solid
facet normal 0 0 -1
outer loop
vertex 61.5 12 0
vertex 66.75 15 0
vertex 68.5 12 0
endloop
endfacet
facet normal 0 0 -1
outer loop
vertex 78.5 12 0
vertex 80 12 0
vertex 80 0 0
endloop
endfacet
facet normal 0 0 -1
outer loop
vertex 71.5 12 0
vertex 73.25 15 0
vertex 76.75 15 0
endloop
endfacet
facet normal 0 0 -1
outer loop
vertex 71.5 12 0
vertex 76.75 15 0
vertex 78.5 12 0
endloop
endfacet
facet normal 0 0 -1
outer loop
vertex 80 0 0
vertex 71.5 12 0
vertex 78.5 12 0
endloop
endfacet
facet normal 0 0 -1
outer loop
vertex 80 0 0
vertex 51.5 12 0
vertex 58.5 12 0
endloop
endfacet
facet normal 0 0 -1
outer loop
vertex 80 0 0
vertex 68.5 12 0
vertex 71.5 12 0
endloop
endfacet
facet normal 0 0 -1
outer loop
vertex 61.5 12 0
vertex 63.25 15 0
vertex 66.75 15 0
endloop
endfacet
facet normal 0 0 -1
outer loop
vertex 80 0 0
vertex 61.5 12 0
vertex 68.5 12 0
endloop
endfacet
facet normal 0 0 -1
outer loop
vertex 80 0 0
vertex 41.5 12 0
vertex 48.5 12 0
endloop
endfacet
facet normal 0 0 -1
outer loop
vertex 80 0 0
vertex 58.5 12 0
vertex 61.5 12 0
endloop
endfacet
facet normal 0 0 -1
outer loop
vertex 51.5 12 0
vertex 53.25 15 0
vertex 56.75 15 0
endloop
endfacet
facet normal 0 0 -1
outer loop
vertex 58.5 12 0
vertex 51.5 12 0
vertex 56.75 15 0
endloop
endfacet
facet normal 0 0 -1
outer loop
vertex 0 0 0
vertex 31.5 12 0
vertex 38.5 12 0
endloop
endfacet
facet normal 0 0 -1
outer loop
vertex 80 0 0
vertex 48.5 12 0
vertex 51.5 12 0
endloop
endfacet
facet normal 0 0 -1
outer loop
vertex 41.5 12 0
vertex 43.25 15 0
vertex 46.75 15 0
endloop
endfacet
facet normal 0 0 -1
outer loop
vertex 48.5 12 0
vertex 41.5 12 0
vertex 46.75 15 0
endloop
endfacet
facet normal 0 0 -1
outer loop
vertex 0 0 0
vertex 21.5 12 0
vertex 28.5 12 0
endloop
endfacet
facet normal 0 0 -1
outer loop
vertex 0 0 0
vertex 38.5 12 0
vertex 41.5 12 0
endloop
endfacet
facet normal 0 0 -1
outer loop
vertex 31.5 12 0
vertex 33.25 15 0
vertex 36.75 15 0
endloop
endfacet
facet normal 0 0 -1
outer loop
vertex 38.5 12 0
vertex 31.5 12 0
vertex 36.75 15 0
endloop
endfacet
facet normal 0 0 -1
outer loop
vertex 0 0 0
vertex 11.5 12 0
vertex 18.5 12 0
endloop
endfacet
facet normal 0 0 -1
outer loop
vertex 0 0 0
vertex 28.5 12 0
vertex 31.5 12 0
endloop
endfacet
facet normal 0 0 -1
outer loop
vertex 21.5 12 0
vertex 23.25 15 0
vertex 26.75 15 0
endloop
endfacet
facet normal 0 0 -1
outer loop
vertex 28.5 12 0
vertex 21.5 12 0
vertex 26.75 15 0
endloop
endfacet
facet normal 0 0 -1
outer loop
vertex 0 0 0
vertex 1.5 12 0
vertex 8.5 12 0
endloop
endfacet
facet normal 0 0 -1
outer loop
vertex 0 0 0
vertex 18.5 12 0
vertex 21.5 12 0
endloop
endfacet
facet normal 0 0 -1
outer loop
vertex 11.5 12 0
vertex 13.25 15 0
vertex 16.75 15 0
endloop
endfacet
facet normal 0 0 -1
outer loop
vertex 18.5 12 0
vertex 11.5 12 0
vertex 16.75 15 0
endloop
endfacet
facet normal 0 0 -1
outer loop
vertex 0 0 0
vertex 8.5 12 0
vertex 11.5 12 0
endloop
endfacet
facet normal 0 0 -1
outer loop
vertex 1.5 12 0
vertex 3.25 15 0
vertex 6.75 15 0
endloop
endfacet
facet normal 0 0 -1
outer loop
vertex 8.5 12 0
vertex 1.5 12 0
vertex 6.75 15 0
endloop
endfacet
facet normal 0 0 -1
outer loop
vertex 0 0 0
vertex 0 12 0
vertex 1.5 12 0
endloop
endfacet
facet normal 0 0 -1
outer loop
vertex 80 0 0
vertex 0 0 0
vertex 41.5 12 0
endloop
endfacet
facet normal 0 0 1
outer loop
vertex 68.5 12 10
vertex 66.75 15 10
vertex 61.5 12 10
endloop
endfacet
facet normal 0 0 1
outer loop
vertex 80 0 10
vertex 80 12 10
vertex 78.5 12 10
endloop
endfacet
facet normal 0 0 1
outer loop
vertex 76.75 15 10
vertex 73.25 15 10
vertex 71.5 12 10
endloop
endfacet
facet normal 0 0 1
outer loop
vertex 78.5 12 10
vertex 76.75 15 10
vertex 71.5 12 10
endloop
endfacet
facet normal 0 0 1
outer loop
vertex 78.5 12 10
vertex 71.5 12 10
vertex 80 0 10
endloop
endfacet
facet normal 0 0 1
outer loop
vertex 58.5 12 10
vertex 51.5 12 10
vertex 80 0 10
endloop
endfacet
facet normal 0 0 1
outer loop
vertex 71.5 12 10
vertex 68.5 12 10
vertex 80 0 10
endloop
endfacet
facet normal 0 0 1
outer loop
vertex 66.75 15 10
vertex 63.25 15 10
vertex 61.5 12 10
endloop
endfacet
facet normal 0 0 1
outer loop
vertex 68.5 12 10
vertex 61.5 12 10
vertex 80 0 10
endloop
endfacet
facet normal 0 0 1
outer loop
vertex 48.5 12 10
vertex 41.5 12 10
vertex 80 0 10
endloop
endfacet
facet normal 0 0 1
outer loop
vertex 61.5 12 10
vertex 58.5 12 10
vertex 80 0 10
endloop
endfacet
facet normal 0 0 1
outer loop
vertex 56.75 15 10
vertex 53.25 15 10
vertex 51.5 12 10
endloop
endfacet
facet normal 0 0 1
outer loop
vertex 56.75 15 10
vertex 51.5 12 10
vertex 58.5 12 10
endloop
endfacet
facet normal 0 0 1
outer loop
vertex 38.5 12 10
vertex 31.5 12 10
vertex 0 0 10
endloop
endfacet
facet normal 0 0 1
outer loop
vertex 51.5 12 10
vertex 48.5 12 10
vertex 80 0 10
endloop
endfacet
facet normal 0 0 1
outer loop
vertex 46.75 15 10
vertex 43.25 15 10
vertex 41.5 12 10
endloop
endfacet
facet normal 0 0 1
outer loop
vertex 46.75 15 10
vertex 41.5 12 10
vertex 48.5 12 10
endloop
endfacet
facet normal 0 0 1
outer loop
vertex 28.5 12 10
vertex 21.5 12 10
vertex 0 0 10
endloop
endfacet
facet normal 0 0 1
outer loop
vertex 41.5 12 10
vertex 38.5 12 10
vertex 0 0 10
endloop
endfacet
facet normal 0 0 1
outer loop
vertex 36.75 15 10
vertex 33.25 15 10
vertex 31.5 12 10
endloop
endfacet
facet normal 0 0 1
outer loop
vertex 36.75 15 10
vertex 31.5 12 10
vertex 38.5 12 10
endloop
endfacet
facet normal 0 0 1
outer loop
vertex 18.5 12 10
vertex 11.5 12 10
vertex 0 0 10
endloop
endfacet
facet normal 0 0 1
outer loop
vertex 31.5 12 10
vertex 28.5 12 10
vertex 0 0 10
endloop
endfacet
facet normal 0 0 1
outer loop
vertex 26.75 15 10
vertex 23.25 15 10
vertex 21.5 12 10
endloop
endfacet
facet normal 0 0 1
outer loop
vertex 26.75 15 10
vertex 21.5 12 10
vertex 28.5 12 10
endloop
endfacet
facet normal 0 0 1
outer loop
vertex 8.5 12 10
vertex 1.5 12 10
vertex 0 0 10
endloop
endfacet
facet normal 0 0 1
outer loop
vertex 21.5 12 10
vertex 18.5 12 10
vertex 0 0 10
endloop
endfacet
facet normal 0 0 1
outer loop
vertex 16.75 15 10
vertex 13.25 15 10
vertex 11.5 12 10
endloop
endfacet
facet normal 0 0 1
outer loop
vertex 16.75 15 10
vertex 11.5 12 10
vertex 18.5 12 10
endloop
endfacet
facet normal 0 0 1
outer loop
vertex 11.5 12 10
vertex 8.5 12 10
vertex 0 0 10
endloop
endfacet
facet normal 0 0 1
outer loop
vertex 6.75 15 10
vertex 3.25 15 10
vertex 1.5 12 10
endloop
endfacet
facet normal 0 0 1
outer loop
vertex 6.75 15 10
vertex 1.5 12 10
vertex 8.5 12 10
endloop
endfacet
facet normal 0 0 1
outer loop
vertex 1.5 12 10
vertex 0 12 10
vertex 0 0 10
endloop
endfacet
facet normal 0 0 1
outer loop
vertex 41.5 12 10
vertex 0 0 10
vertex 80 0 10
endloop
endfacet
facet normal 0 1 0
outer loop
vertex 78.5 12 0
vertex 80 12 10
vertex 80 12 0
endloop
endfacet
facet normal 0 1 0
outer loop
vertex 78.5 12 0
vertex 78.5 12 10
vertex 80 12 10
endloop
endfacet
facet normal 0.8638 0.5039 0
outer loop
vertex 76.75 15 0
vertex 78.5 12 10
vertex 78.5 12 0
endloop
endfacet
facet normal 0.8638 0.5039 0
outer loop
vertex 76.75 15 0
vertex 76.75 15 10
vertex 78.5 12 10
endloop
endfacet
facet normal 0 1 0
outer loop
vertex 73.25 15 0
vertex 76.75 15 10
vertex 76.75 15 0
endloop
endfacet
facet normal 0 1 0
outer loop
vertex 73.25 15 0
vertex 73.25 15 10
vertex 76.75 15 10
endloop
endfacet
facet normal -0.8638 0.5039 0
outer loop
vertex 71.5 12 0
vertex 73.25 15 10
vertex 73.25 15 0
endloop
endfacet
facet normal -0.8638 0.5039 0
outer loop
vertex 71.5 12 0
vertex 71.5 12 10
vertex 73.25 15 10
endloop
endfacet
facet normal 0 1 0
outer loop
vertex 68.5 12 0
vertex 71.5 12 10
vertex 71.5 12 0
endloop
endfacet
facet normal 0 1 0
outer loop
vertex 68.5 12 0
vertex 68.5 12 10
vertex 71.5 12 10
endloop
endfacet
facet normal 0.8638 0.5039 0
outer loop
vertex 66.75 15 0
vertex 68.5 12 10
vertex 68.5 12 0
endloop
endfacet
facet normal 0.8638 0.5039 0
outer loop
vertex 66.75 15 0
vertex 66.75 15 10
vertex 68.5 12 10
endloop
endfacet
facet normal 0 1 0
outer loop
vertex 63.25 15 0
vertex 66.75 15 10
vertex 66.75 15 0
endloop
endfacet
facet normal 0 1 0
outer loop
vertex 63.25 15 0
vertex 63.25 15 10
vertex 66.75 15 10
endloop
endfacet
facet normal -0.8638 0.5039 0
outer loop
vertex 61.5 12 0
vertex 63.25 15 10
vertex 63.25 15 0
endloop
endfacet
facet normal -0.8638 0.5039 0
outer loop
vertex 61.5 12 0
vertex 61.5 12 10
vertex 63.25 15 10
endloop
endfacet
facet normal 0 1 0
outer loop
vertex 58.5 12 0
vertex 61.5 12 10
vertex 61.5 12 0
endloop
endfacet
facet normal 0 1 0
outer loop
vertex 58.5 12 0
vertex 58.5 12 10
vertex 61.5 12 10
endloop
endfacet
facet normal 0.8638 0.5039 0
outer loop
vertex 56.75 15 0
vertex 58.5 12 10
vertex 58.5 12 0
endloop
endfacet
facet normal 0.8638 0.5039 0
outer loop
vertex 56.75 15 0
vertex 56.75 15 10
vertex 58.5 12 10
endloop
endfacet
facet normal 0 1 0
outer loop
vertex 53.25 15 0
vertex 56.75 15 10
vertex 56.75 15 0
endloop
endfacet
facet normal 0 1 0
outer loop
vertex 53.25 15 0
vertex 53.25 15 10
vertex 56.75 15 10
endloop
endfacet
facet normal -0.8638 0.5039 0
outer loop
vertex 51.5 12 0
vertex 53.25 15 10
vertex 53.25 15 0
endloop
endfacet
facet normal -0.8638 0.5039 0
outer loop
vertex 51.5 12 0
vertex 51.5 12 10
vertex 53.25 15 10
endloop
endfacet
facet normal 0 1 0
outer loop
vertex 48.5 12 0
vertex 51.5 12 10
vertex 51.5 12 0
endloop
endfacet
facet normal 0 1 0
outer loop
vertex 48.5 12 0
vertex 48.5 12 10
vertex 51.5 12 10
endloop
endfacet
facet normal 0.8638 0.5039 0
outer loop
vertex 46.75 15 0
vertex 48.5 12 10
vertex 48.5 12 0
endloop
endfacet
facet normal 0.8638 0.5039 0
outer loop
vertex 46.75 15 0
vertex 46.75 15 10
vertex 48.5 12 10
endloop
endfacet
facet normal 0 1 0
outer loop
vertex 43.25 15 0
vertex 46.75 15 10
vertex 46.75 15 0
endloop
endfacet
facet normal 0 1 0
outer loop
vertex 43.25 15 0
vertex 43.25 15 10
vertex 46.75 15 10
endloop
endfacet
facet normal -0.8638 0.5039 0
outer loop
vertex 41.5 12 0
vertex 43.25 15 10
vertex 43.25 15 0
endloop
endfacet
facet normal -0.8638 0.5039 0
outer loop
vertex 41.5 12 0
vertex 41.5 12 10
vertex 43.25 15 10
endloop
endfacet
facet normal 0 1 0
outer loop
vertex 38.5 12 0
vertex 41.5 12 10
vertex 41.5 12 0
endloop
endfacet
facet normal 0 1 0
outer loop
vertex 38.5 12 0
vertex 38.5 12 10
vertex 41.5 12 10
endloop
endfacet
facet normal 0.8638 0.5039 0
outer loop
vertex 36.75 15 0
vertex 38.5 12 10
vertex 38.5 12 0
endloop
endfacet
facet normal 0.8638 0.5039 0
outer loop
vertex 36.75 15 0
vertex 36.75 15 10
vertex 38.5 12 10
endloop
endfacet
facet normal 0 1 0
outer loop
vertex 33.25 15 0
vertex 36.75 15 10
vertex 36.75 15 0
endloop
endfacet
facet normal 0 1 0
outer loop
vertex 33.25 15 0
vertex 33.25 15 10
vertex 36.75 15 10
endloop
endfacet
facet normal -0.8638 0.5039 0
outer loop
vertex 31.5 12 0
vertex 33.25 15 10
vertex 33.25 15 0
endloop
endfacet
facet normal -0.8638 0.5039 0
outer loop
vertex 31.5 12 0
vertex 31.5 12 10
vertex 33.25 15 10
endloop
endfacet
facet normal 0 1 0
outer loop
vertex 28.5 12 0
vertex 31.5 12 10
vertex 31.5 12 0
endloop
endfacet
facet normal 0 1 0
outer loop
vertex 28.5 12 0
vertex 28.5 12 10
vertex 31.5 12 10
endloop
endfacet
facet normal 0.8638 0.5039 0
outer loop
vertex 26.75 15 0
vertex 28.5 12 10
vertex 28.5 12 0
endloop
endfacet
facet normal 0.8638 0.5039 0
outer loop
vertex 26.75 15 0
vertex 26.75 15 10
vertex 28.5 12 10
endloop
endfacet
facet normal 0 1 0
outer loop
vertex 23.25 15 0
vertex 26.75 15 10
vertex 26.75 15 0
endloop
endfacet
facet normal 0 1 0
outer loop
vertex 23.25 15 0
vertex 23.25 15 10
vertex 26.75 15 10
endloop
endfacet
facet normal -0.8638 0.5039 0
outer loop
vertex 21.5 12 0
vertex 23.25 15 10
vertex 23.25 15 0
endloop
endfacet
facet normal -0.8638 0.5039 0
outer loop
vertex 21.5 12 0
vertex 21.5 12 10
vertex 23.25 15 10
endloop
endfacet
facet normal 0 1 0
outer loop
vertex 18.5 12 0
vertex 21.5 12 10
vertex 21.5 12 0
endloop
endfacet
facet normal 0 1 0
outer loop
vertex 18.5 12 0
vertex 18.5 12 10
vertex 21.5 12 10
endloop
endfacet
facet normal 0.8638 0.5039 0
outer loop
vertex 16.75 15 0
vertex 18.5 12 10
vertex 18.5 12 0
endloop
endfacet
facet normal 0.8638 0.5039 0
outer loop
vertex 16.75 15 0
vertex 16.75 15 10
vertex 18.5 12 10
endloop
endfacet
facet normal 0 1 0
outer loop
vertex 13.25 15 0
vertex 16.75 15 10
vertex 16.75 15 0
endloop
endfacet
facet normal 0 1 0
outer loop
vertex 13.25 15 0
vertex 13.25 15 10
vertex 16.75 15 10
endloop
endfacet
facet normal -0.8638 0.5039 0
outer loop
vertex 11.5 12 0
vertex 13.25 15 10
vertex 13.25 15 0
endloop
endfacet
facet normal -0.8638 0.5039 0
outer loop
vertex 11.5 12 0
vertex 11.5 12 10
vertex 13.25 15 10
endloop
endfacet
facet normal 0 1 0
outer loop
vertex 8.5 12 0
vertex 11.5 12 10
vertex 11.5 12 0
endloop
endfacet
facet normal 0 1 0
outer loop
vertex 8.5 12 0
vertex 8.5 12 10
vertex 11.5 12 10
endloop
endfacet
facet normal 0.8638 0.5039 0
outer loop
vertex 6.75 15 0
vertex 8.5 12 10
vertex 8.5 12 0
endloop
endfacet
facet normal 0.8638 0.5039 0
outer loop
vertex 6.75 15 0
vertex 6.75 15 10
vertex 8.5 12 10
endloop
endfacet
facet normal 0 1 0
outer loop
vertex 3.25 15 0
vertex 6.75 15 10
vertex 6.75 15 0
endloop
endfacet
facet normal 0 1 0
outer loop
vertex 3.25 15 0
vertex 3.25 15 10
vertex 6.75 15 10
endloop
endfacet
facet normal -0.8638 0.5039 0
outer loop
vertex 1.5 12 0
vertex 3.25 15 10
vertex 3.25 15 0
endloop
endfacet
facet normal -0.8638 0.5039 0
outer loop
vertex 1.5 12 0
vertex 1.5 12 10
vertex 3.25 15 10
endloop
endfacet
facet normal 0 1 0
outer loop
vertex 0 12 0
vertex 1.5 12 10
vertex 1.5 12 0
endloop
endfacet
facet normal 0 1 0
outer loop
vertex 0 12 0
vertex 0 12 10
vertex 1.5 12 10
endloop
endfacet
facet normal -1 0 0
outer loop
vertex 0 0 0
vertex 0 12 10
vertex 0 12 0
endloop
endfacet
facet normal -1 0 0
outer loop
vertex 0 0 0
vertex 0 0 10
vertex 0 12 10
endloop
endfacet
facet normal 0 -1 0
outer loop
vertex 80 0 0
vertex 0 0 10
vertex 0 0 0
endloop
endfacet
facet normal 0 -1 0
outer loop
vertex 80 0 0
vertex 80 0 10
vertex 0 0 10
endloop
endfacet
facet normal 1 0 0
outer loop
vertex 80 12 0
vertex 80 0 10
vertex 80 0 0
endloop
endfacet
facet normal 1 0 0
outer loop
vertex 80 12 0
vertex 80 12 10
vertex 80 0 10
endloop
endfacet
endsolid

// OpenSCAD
$fn = 32;

// ----------------------------------------------------------------------
// Gear rack: 8 teeth, pitch 10 mm
// ----------------------------------------------------------------------

// --- parameters (mm) ---
teeth = 8;                // number of teeth
pitch = 10;               // tooth pitch, X
root_w = 7;               // tooth width at the root
tip_w = 3.5;              // tooth width at the tip
base_h = 12;              // rack body height, Y
tooth_h = 3;              // tooth height above the body
plate_t = 10;             // rack width, Z (extrusion height)
fit_tol = 0.05;           // declared fit tolerance (prompt contract)
free_tol = 0.2;           // declared free tolerance (prompt contract)

rack_l = teeth * pitch;  // overall length
total_h = base_h + tooth_h;  // overall height

profile = [[0, 0], [80, 0], [80, 12], [78.5, 12], [76.75, 15], [73.25, 15], [71.5, 12], [68.5, 12], [66.75, 15], [63.25, 15], [61.5, 12], [58.5, 12], [56.75, 15], [53.25, 15], [51.5, 12], [48.5, 12], [46.75, 15], [43.25, 15], [41.5, 12], [38.5, 12], [36.75, 15], [33.25, 15], [31.5, 12], [28.5, 12], [26.75, 15], [23.25, 15], [21.5, 12], [18.5, 12], [16.75, 15], [13.25, 15], [11.5, 12], [8.5, 12], [6.75, 15], [3.25, 15], [1.5, 12], [0, 12]];  // primary outline, 36 points, counter clockwise

// --- the one profile operation ---
linear_extrude(height = plate_t) polygon(points = profile);
